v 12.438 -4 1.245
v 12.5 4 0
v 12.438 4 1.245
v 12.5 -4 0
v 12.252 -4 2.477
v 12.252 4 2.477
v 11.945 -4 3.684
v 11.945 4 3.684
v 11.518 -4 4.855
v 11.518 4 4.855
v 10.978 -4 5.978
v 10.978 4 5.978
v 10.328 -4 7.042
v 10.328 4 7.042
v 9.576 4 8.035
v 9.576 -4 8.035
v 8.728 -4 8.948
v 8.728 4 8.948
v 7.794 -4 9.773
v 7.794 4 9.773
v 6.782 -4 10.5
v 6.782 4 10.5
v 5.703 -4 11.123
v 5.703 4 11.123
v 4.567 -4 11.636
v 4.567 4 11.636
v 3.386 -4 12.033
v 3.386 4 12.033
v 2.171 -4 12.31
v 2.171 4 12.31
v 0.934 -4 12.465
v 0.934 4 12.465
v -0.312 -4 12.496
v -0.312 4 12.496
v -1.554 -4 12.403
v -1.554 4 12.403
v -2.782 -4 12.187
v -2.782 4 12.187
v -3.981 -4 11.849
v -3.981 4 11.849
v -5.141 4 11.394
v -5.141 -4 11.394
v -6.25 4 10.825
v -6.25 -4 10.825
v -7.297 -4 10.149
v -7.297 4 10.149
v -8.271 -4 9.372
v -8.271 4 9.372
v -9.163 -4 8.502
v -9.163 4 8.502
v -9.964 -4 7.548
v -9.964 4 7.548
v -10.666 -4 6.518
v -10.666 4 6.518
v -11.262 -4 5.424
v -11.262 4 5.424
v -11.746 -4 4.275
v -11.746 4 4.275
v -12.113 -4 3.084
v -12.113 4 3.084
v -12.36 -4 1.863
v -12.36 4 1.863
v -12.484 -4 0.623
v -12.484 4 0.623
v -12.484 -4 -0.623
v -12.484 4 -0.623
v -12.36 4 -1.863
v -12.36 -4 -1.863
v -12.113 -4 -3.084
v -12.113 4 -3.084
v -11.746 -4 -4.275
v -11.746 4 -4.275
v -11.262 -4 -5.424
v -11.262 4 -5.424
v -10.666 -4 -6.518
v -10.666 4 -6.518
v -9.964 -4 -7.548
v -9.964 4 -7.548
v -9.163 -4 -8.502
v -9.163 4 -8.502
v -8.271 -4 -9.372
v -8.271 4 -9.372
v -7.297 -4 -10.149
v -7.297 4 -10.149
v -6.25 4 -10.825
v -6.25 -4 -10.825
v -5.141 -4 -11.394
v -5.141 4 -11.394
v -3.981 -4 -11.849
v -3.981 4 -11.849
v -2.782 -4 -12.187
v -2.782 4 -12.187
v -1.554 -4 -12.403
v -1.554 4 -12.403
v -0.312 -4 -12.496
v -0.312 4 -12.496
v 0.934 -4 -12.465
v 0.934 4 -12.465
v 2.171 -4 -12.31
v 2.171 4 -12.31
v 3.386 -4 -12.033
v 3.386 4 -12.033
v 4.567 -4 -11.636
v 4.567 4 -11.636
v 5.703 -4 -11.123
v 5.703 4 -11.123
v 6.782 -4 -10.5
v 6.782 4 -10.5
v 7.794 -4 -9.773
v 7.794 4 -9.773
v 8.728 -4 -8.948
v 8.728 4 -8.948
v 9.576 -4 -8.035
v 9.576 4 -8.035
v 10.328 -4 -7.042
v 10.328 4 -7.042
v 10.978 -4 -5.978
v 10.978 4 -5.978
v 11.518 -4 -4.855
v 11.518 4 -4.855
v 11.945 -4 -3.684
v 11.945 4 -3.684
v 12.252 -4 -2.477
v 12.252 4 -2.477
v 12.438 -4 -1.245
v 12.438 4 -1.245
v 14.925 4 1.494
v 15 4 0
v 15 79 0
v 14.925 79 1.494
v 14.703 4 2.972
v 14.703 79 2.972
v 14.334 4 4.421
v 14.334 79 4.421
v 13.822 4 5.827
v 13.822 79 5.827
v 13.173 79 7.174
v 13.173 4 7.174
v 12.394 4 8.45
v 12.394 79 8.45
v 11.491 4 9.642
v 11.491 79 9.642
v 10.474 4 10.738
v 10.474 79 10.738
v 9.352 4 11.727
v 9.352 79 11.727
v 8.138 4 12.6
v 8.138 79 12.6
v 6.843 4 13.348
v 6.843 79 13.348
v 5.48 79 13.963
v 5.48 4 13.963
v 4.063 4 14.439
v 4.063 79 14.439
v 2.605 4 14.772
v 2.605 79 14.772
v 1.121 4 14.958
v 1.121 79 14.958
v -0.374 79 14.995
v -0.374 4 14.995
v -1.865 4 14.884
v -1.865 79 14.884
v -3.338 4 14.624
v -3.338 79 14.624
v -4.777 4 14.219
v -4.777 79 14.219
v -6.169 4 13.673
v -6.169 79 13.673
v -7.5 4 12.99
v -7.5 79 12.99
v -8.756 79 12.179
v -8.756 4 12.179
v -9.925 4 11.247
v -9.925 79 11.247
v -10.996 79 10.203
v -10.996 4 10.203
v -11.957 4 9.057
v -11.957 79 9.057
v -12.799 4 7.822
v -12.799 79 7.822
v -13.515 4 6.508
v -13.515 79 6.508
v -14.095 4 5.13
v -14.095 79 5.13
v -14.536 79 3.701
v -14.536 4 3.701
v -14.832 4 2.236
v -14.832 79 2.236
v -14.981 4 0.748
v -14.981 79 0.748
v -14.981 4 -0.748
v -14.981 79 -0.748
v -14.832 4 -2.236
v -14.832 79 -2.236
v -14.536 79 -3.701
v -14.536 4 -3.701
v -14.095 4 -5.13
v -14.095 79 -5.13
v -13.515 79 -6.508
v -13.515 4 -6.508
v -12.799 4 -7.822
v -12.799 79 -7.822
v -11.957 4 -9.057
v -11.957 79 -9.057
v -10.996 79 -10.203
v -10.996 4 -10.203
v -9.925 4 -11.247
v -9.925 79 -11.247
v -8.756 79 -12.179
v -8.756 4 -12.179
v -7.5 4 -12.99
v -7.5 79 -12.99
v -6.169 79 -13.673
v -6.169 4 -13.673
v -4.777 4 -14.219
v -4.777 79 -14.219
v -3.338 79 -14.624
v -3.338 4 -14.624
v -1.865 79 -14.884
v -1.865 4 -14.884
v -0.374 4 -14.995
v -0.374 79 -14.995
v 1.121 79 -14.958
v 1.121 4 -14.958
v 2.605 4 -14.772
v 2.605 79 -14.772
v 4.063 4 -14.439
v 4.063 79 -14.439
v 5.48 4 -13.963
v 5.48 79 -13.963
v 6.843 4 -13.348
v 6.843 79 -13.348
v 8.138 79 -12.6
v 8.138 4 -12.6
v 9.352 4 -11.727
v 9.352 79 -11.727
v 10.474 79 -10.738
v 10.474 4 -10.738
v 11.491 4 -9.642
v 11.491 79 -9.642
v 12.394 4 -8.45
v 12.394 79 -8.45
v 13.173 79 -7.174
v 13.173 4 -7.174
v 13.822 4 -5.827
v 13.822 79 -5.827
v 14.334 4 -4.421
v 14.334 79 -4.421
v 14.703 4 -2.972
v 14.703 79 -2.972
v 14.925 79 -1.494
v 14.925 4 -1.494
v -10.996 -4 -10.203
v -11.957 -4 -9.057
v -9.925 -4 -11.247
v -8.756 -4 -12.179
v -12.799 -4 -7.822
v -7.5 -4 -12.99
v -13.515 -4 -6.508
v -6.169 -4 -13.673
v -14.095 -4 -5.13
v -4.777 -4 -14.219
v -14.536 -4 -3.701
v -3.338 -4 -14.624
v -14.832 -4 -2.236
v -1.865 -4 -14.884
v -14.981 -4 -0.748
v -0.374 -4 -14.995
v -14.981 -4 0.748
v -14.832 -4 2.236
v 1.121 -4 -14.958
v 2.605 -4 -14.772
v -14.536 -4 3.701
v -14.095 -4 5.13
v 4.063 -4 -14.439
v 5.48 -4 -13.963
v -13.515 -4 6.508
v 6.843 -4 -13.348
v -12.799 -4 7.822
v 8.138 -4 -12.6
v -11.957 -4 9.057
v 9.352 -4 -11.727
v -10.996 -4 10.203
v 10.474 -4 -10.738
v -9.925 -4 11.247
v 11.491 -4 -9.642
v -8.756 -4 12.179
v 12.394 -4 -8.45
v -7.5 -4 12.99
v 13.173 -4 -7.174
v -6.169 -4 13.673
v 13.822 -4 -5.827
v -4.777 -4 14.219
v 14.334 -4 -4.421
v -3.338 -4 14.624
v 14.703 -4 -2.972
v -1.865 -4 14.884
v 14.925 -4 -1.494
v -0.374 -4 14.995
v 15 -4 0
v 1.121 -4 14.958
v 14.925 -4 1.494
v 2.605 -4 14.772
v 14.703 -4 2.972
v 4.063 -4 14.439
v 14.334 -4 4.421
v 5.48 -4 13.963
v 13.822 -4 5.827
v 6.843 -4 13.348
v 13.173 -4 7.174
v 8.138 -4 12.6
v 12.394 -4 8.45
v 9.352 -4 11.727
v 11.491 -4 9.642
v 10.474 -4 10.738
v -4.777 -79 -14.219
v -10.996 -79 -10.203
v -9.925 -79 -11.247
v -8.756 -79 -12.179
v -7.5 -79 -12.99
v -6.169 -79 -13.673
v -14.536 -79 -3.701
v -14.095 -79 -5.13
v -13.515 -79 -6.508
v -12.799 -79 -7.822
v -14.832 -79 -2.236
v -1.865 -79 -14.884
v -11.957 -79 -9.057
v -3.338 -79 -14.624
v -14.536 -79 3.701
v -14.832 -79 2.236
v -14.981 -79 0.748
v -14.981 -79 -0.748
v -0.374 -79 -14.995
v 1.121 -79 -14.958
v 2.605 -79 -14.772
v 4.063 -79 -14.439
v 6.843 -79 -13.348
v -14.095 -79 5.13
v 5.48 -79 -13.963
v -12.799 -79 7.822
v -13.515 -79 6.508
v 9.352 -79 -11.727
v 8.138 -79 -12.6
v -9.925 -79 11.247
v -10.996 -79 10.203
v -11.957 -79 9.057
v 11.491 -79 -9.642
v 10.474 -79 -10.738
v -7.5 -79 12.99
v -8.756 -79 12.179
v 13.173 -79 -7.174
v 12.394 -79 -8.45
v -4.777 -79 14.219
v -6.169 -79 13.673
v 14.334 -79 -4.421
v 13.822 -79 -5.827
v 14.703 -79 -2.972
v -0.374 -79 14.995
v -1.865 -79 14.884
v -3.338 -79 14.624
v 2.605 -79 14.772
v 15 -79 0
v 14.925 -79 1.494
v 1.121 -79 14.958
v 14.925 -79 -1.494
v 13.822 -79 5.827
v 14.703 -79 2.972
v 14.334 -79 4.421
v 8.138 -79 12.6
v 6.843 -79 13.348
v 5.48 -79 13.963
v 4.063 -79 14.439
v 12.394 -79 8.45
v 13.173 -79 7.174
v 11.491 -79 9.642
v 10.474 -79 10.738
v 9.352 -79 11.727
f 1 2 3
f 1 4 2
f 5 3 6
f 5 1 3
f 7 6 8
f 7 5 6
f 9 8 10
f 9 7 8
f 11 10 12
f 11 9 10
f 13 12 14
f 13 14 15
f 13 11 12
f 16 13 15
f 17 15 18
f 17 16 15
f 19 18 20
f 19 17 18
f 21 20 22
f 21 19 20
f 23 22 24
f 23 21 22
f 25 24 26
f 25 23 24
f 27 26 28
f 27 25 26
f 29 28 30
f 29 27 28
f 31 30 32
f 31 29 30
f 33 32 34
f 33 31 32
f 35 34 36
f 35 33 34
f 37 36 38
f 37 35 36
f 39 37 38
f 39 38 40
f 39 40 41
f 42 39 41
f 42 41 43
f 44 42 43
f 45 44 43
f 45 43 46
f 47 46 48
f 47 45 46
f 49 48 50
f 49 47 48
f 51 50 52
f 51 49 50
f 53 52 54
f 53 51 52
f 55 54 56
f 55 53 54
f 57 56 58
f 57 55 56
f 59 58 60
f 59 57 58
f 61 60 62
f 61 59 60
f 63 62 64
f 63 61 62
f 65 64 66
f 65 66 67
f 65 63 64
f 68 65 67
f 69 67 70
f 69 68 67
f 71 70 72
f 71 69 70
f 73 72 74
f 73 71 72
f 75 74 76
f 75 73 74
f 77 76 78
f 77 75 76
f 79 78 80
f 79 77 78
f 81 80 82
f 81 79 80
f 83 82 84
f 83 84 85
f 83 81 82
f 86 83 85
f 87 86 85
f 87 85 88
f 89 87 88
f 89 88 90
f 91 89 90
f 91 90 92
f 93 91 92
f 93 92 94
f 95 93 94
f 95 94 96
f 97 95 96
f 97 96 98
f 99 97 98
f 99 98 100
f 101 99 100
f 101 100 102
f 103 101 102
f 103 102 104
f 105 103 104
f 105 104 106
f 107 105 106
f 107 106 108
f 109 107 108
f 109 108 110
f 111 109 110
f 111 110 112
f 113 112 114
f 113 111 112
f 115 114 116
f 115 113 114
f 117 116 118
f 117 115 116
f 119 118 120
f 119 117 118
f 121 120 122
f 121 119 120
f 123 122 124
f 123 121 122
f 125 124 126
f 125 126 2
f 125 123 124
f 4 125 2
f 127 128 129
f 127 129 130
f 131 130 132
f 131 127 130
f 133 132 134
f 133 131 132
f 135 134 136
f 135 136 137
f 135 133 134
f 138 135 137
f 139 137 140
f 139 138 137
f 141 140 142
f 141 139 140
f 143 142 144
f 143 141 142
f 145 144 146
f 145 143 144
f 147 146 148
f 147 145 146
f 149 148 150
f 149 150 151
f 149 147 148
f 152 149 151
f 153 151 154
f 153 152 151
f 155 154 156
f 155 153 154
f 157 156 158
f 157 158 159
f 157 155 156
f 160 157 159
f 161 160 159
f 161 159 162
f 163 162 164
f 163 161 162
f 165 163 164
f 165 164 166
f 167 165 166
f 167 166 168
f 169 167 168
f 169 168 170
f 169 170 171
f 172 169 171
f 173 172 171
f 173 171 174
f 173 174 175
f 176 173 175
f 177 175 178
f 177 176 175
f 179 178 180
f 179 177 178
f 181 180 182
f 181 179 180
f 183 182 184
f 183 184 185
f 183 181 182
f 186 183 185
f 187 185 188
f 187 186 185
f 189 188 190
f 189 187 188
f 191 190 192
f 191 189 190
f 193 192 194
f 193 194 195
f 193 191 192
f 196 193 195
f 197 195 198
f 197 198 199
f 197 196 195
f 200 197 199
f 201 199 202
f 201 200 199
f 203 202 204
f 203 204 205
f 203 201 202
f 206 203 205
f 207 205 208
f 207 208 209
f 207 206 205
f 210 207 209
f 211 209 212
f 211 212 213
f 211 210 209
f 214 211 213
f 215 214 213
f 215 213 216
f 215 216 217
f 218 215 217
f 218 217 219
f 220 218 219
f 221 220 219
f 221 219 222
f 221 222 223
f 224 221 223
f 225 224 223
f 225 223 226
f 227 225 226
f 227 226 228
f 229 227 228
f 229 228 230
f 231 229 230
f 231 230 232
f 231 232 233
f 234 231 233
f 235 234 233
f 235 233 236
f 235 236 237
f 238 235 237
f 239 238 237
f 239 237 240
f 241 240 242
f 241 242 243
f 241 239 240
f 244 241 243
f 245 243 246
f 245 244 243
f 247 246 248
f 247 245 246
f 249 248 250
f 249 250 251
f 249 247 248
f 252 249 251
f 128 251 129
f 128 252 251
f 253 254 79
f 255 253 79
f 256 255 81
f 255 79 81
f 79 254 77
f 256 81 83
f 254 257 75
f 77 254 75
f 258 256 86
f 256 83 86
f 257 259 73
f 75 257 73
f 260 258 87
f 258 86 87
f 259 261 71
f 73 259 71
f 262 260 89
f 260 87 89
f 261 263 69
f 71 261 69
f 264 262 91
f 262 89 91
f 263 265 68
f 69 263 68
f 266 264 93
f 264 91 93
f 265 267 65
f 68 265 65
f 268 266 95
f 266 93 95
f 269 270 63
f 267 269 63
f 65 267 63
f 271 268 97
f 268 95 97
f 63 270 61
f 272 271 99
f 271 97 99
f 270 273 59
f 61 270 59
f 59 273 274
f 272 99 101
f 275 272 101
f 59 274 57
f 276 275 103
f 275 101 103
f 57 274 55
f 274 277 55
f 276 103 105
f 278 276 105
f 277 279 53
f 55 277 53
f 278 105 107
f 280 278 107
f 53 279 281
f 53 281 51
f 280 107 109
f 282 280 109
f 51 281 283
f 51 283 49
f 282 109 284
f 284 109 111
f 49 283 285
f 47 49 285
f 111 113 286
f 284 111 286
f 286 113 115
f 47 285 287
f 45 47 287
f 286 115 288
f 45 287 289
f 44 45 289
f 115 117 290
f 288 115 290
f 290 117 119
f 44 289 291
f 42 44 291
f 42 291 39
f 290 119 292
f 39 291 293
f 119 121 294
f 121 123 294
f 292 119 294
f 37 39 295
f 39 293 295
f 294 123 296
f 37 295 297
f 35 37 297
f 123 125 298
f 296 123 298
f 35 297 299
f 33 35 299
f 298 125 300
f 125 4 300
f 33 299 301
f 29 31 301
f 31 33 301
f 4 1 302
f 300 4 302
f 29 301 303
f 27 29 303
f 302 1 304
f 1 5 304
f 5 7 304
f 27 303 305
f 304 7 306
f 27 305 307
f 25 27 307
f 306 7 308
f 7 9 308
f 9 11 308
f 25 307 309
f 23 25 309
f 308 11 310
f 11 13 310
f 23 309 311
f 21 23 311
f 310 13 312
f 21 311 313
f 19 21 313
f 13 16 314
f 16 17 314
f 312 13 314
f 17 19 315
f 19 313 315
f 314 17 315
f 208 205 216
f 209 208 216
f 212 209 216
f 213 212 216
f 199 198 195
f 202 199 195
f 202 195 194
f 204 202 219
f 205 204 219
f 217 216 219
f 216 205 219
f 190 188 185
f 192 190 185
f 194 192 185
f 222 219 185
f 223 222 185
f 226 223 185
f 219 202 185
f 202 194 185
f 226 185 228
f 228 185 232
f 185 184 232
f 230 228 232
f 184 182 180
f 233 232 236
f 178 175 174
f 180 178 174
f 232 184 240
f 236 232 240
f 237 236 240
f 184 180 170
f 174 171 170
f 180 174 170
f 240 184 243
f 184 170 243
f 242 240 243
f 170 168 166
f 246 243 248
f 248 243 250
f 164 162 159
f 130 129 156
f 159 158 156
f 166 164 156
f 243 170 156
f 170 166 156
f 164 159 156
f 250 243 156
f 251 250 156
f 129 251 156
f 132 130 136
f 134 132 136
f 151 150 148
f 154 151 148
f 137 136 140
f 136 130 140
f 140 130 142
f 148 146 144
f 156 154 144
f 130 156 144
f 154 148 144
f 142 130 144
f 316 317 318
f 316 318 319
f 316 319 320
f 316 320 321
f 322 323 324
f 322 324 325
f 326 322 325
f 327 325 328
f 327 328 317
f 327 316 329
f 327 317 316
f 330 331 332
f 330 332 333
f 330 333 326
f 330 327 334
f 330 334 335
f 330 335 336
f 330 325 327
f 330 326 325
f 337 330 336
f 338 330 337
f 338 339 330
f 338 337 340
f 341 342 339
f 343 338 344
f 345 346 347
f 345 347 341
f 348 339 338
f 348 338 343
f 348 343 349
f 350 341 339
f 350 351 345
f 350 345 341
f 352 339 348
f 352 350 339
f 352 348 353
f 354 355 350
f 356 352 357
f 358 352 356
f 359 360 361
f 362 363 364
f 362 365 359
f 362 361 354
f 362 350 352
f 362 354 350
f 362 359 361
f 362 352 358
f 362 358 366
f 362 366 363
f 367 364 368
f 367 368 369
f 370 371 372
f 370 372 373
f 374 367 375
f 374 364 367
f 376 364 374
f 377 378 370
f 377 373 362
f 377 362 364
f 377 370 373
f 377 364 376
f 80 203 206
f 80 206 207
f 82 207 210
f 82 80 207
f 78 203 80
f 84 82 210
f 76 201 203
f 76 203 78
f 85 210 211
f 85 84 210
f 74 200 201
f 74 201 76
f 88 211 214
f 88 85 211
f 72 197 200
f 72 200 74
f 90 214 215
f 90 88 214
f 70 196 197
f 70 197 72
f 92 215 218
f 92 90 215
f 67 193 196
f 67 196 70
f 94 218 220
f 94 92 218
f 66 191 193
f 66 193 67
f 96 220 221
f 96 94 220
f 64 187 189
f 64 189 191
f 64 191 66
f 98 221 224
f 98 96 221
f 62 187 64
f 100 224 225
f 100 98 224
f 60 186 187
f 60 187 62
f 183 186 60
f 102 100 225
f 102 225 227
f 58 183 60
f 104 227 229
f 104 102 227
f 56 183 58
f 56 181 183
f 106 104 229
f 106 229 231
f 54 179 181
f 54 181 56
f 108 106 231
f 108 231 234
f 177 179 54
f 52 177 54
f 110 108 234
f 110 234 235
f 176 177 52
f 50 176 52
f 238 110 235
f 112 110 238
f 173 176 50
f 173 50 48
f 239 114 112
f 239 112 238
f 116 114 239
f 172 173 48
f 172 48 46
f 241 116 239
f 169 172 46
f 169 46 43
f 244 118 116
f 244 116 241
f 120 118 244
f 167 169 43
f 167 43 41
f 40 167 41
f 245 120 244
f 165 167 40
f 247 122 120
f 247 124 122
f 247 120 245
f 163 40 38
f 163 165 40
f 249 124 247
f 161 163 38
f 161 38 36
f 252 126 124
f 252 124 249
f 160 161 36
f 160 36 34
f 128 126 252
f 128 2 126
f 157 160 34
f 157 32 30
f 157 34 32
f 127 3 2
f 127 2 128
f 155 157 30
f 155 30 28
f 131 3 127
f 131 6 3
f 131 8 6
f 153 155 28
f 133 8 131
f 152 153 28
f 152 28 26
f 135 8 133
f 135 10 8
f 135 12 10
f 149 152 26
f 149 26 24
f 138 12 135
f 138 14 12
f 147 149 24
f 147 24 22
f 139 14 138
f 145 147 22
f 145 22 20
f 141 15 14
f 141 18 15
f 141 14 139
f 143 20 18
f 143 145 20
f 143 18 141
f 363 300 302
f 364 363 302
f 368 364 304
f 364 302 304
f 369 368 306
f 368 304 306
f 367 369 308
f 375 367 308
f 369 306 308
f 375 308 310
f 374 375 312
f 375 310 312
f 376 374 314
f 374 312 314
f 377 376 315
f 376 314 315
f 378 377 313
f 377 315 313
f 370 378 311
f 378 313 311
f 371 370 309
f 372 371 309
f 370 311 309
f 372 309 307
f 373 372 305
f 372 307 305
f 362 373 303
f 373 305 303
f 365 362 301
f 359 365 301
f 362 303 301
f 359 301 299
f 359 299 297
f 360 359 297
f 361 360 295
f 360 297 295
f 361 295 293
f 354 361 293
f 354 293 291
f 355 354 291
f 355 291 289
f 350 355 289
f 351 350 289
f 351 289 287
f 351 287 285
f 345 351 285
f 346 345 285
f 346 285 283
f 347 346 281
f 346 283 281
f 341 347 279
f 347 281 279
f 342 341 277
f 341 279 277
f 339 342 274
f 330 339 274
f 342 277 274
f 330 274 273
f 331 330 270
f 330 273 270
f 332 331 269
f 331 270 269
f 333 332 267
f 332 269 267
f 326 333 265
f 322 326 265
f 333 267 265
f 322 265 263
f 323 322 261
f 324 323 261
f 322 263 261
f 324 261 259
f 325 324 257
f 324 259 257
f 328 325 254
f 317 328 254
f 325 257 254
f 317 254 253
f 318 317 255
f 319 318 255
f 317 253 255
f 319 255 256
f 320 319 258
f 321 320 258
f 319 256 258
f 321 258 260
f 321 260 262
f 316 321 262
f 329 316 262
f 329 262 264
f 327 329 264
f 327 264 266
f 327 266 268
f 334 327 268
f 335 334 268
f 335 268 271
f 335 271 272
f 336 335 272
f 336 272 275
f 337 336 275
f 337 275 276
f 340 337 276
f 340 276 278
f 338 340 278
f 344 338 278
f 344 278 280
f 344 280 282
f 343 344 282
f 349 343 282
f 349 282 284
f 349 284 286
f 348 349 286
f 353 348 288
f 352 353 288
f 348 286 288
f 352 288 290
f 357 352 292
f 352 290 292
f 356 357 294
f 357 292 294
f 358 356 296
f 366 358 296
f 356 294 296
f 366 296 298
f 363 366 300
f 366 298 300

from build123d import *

# Parameters (mm, degrees)
F0_R     = 12.5
F1_DEPTH = 4
F2_R     = 15
F3_DEPTH = 75


with BuildPart() as f1:
    # F0 (on Front) → F1 (new body)
    with BuildSketch(Plane.XZ):
        Circle(F0_R)
    extrude(amount=F1_DEPTH)

    # F2 (on face) → F3 (join)
    with BuildSketch(Plane.XZ.offset(4)):
        Circle(F2_R)
    extrude(amount=F3_DEPTH)

    # F4: F1 across plane


with BuildPart() as f1_1:
    add(f1.part)
    add(f1.part.mirror(Plane.XZ))


solid = f1_1.part
